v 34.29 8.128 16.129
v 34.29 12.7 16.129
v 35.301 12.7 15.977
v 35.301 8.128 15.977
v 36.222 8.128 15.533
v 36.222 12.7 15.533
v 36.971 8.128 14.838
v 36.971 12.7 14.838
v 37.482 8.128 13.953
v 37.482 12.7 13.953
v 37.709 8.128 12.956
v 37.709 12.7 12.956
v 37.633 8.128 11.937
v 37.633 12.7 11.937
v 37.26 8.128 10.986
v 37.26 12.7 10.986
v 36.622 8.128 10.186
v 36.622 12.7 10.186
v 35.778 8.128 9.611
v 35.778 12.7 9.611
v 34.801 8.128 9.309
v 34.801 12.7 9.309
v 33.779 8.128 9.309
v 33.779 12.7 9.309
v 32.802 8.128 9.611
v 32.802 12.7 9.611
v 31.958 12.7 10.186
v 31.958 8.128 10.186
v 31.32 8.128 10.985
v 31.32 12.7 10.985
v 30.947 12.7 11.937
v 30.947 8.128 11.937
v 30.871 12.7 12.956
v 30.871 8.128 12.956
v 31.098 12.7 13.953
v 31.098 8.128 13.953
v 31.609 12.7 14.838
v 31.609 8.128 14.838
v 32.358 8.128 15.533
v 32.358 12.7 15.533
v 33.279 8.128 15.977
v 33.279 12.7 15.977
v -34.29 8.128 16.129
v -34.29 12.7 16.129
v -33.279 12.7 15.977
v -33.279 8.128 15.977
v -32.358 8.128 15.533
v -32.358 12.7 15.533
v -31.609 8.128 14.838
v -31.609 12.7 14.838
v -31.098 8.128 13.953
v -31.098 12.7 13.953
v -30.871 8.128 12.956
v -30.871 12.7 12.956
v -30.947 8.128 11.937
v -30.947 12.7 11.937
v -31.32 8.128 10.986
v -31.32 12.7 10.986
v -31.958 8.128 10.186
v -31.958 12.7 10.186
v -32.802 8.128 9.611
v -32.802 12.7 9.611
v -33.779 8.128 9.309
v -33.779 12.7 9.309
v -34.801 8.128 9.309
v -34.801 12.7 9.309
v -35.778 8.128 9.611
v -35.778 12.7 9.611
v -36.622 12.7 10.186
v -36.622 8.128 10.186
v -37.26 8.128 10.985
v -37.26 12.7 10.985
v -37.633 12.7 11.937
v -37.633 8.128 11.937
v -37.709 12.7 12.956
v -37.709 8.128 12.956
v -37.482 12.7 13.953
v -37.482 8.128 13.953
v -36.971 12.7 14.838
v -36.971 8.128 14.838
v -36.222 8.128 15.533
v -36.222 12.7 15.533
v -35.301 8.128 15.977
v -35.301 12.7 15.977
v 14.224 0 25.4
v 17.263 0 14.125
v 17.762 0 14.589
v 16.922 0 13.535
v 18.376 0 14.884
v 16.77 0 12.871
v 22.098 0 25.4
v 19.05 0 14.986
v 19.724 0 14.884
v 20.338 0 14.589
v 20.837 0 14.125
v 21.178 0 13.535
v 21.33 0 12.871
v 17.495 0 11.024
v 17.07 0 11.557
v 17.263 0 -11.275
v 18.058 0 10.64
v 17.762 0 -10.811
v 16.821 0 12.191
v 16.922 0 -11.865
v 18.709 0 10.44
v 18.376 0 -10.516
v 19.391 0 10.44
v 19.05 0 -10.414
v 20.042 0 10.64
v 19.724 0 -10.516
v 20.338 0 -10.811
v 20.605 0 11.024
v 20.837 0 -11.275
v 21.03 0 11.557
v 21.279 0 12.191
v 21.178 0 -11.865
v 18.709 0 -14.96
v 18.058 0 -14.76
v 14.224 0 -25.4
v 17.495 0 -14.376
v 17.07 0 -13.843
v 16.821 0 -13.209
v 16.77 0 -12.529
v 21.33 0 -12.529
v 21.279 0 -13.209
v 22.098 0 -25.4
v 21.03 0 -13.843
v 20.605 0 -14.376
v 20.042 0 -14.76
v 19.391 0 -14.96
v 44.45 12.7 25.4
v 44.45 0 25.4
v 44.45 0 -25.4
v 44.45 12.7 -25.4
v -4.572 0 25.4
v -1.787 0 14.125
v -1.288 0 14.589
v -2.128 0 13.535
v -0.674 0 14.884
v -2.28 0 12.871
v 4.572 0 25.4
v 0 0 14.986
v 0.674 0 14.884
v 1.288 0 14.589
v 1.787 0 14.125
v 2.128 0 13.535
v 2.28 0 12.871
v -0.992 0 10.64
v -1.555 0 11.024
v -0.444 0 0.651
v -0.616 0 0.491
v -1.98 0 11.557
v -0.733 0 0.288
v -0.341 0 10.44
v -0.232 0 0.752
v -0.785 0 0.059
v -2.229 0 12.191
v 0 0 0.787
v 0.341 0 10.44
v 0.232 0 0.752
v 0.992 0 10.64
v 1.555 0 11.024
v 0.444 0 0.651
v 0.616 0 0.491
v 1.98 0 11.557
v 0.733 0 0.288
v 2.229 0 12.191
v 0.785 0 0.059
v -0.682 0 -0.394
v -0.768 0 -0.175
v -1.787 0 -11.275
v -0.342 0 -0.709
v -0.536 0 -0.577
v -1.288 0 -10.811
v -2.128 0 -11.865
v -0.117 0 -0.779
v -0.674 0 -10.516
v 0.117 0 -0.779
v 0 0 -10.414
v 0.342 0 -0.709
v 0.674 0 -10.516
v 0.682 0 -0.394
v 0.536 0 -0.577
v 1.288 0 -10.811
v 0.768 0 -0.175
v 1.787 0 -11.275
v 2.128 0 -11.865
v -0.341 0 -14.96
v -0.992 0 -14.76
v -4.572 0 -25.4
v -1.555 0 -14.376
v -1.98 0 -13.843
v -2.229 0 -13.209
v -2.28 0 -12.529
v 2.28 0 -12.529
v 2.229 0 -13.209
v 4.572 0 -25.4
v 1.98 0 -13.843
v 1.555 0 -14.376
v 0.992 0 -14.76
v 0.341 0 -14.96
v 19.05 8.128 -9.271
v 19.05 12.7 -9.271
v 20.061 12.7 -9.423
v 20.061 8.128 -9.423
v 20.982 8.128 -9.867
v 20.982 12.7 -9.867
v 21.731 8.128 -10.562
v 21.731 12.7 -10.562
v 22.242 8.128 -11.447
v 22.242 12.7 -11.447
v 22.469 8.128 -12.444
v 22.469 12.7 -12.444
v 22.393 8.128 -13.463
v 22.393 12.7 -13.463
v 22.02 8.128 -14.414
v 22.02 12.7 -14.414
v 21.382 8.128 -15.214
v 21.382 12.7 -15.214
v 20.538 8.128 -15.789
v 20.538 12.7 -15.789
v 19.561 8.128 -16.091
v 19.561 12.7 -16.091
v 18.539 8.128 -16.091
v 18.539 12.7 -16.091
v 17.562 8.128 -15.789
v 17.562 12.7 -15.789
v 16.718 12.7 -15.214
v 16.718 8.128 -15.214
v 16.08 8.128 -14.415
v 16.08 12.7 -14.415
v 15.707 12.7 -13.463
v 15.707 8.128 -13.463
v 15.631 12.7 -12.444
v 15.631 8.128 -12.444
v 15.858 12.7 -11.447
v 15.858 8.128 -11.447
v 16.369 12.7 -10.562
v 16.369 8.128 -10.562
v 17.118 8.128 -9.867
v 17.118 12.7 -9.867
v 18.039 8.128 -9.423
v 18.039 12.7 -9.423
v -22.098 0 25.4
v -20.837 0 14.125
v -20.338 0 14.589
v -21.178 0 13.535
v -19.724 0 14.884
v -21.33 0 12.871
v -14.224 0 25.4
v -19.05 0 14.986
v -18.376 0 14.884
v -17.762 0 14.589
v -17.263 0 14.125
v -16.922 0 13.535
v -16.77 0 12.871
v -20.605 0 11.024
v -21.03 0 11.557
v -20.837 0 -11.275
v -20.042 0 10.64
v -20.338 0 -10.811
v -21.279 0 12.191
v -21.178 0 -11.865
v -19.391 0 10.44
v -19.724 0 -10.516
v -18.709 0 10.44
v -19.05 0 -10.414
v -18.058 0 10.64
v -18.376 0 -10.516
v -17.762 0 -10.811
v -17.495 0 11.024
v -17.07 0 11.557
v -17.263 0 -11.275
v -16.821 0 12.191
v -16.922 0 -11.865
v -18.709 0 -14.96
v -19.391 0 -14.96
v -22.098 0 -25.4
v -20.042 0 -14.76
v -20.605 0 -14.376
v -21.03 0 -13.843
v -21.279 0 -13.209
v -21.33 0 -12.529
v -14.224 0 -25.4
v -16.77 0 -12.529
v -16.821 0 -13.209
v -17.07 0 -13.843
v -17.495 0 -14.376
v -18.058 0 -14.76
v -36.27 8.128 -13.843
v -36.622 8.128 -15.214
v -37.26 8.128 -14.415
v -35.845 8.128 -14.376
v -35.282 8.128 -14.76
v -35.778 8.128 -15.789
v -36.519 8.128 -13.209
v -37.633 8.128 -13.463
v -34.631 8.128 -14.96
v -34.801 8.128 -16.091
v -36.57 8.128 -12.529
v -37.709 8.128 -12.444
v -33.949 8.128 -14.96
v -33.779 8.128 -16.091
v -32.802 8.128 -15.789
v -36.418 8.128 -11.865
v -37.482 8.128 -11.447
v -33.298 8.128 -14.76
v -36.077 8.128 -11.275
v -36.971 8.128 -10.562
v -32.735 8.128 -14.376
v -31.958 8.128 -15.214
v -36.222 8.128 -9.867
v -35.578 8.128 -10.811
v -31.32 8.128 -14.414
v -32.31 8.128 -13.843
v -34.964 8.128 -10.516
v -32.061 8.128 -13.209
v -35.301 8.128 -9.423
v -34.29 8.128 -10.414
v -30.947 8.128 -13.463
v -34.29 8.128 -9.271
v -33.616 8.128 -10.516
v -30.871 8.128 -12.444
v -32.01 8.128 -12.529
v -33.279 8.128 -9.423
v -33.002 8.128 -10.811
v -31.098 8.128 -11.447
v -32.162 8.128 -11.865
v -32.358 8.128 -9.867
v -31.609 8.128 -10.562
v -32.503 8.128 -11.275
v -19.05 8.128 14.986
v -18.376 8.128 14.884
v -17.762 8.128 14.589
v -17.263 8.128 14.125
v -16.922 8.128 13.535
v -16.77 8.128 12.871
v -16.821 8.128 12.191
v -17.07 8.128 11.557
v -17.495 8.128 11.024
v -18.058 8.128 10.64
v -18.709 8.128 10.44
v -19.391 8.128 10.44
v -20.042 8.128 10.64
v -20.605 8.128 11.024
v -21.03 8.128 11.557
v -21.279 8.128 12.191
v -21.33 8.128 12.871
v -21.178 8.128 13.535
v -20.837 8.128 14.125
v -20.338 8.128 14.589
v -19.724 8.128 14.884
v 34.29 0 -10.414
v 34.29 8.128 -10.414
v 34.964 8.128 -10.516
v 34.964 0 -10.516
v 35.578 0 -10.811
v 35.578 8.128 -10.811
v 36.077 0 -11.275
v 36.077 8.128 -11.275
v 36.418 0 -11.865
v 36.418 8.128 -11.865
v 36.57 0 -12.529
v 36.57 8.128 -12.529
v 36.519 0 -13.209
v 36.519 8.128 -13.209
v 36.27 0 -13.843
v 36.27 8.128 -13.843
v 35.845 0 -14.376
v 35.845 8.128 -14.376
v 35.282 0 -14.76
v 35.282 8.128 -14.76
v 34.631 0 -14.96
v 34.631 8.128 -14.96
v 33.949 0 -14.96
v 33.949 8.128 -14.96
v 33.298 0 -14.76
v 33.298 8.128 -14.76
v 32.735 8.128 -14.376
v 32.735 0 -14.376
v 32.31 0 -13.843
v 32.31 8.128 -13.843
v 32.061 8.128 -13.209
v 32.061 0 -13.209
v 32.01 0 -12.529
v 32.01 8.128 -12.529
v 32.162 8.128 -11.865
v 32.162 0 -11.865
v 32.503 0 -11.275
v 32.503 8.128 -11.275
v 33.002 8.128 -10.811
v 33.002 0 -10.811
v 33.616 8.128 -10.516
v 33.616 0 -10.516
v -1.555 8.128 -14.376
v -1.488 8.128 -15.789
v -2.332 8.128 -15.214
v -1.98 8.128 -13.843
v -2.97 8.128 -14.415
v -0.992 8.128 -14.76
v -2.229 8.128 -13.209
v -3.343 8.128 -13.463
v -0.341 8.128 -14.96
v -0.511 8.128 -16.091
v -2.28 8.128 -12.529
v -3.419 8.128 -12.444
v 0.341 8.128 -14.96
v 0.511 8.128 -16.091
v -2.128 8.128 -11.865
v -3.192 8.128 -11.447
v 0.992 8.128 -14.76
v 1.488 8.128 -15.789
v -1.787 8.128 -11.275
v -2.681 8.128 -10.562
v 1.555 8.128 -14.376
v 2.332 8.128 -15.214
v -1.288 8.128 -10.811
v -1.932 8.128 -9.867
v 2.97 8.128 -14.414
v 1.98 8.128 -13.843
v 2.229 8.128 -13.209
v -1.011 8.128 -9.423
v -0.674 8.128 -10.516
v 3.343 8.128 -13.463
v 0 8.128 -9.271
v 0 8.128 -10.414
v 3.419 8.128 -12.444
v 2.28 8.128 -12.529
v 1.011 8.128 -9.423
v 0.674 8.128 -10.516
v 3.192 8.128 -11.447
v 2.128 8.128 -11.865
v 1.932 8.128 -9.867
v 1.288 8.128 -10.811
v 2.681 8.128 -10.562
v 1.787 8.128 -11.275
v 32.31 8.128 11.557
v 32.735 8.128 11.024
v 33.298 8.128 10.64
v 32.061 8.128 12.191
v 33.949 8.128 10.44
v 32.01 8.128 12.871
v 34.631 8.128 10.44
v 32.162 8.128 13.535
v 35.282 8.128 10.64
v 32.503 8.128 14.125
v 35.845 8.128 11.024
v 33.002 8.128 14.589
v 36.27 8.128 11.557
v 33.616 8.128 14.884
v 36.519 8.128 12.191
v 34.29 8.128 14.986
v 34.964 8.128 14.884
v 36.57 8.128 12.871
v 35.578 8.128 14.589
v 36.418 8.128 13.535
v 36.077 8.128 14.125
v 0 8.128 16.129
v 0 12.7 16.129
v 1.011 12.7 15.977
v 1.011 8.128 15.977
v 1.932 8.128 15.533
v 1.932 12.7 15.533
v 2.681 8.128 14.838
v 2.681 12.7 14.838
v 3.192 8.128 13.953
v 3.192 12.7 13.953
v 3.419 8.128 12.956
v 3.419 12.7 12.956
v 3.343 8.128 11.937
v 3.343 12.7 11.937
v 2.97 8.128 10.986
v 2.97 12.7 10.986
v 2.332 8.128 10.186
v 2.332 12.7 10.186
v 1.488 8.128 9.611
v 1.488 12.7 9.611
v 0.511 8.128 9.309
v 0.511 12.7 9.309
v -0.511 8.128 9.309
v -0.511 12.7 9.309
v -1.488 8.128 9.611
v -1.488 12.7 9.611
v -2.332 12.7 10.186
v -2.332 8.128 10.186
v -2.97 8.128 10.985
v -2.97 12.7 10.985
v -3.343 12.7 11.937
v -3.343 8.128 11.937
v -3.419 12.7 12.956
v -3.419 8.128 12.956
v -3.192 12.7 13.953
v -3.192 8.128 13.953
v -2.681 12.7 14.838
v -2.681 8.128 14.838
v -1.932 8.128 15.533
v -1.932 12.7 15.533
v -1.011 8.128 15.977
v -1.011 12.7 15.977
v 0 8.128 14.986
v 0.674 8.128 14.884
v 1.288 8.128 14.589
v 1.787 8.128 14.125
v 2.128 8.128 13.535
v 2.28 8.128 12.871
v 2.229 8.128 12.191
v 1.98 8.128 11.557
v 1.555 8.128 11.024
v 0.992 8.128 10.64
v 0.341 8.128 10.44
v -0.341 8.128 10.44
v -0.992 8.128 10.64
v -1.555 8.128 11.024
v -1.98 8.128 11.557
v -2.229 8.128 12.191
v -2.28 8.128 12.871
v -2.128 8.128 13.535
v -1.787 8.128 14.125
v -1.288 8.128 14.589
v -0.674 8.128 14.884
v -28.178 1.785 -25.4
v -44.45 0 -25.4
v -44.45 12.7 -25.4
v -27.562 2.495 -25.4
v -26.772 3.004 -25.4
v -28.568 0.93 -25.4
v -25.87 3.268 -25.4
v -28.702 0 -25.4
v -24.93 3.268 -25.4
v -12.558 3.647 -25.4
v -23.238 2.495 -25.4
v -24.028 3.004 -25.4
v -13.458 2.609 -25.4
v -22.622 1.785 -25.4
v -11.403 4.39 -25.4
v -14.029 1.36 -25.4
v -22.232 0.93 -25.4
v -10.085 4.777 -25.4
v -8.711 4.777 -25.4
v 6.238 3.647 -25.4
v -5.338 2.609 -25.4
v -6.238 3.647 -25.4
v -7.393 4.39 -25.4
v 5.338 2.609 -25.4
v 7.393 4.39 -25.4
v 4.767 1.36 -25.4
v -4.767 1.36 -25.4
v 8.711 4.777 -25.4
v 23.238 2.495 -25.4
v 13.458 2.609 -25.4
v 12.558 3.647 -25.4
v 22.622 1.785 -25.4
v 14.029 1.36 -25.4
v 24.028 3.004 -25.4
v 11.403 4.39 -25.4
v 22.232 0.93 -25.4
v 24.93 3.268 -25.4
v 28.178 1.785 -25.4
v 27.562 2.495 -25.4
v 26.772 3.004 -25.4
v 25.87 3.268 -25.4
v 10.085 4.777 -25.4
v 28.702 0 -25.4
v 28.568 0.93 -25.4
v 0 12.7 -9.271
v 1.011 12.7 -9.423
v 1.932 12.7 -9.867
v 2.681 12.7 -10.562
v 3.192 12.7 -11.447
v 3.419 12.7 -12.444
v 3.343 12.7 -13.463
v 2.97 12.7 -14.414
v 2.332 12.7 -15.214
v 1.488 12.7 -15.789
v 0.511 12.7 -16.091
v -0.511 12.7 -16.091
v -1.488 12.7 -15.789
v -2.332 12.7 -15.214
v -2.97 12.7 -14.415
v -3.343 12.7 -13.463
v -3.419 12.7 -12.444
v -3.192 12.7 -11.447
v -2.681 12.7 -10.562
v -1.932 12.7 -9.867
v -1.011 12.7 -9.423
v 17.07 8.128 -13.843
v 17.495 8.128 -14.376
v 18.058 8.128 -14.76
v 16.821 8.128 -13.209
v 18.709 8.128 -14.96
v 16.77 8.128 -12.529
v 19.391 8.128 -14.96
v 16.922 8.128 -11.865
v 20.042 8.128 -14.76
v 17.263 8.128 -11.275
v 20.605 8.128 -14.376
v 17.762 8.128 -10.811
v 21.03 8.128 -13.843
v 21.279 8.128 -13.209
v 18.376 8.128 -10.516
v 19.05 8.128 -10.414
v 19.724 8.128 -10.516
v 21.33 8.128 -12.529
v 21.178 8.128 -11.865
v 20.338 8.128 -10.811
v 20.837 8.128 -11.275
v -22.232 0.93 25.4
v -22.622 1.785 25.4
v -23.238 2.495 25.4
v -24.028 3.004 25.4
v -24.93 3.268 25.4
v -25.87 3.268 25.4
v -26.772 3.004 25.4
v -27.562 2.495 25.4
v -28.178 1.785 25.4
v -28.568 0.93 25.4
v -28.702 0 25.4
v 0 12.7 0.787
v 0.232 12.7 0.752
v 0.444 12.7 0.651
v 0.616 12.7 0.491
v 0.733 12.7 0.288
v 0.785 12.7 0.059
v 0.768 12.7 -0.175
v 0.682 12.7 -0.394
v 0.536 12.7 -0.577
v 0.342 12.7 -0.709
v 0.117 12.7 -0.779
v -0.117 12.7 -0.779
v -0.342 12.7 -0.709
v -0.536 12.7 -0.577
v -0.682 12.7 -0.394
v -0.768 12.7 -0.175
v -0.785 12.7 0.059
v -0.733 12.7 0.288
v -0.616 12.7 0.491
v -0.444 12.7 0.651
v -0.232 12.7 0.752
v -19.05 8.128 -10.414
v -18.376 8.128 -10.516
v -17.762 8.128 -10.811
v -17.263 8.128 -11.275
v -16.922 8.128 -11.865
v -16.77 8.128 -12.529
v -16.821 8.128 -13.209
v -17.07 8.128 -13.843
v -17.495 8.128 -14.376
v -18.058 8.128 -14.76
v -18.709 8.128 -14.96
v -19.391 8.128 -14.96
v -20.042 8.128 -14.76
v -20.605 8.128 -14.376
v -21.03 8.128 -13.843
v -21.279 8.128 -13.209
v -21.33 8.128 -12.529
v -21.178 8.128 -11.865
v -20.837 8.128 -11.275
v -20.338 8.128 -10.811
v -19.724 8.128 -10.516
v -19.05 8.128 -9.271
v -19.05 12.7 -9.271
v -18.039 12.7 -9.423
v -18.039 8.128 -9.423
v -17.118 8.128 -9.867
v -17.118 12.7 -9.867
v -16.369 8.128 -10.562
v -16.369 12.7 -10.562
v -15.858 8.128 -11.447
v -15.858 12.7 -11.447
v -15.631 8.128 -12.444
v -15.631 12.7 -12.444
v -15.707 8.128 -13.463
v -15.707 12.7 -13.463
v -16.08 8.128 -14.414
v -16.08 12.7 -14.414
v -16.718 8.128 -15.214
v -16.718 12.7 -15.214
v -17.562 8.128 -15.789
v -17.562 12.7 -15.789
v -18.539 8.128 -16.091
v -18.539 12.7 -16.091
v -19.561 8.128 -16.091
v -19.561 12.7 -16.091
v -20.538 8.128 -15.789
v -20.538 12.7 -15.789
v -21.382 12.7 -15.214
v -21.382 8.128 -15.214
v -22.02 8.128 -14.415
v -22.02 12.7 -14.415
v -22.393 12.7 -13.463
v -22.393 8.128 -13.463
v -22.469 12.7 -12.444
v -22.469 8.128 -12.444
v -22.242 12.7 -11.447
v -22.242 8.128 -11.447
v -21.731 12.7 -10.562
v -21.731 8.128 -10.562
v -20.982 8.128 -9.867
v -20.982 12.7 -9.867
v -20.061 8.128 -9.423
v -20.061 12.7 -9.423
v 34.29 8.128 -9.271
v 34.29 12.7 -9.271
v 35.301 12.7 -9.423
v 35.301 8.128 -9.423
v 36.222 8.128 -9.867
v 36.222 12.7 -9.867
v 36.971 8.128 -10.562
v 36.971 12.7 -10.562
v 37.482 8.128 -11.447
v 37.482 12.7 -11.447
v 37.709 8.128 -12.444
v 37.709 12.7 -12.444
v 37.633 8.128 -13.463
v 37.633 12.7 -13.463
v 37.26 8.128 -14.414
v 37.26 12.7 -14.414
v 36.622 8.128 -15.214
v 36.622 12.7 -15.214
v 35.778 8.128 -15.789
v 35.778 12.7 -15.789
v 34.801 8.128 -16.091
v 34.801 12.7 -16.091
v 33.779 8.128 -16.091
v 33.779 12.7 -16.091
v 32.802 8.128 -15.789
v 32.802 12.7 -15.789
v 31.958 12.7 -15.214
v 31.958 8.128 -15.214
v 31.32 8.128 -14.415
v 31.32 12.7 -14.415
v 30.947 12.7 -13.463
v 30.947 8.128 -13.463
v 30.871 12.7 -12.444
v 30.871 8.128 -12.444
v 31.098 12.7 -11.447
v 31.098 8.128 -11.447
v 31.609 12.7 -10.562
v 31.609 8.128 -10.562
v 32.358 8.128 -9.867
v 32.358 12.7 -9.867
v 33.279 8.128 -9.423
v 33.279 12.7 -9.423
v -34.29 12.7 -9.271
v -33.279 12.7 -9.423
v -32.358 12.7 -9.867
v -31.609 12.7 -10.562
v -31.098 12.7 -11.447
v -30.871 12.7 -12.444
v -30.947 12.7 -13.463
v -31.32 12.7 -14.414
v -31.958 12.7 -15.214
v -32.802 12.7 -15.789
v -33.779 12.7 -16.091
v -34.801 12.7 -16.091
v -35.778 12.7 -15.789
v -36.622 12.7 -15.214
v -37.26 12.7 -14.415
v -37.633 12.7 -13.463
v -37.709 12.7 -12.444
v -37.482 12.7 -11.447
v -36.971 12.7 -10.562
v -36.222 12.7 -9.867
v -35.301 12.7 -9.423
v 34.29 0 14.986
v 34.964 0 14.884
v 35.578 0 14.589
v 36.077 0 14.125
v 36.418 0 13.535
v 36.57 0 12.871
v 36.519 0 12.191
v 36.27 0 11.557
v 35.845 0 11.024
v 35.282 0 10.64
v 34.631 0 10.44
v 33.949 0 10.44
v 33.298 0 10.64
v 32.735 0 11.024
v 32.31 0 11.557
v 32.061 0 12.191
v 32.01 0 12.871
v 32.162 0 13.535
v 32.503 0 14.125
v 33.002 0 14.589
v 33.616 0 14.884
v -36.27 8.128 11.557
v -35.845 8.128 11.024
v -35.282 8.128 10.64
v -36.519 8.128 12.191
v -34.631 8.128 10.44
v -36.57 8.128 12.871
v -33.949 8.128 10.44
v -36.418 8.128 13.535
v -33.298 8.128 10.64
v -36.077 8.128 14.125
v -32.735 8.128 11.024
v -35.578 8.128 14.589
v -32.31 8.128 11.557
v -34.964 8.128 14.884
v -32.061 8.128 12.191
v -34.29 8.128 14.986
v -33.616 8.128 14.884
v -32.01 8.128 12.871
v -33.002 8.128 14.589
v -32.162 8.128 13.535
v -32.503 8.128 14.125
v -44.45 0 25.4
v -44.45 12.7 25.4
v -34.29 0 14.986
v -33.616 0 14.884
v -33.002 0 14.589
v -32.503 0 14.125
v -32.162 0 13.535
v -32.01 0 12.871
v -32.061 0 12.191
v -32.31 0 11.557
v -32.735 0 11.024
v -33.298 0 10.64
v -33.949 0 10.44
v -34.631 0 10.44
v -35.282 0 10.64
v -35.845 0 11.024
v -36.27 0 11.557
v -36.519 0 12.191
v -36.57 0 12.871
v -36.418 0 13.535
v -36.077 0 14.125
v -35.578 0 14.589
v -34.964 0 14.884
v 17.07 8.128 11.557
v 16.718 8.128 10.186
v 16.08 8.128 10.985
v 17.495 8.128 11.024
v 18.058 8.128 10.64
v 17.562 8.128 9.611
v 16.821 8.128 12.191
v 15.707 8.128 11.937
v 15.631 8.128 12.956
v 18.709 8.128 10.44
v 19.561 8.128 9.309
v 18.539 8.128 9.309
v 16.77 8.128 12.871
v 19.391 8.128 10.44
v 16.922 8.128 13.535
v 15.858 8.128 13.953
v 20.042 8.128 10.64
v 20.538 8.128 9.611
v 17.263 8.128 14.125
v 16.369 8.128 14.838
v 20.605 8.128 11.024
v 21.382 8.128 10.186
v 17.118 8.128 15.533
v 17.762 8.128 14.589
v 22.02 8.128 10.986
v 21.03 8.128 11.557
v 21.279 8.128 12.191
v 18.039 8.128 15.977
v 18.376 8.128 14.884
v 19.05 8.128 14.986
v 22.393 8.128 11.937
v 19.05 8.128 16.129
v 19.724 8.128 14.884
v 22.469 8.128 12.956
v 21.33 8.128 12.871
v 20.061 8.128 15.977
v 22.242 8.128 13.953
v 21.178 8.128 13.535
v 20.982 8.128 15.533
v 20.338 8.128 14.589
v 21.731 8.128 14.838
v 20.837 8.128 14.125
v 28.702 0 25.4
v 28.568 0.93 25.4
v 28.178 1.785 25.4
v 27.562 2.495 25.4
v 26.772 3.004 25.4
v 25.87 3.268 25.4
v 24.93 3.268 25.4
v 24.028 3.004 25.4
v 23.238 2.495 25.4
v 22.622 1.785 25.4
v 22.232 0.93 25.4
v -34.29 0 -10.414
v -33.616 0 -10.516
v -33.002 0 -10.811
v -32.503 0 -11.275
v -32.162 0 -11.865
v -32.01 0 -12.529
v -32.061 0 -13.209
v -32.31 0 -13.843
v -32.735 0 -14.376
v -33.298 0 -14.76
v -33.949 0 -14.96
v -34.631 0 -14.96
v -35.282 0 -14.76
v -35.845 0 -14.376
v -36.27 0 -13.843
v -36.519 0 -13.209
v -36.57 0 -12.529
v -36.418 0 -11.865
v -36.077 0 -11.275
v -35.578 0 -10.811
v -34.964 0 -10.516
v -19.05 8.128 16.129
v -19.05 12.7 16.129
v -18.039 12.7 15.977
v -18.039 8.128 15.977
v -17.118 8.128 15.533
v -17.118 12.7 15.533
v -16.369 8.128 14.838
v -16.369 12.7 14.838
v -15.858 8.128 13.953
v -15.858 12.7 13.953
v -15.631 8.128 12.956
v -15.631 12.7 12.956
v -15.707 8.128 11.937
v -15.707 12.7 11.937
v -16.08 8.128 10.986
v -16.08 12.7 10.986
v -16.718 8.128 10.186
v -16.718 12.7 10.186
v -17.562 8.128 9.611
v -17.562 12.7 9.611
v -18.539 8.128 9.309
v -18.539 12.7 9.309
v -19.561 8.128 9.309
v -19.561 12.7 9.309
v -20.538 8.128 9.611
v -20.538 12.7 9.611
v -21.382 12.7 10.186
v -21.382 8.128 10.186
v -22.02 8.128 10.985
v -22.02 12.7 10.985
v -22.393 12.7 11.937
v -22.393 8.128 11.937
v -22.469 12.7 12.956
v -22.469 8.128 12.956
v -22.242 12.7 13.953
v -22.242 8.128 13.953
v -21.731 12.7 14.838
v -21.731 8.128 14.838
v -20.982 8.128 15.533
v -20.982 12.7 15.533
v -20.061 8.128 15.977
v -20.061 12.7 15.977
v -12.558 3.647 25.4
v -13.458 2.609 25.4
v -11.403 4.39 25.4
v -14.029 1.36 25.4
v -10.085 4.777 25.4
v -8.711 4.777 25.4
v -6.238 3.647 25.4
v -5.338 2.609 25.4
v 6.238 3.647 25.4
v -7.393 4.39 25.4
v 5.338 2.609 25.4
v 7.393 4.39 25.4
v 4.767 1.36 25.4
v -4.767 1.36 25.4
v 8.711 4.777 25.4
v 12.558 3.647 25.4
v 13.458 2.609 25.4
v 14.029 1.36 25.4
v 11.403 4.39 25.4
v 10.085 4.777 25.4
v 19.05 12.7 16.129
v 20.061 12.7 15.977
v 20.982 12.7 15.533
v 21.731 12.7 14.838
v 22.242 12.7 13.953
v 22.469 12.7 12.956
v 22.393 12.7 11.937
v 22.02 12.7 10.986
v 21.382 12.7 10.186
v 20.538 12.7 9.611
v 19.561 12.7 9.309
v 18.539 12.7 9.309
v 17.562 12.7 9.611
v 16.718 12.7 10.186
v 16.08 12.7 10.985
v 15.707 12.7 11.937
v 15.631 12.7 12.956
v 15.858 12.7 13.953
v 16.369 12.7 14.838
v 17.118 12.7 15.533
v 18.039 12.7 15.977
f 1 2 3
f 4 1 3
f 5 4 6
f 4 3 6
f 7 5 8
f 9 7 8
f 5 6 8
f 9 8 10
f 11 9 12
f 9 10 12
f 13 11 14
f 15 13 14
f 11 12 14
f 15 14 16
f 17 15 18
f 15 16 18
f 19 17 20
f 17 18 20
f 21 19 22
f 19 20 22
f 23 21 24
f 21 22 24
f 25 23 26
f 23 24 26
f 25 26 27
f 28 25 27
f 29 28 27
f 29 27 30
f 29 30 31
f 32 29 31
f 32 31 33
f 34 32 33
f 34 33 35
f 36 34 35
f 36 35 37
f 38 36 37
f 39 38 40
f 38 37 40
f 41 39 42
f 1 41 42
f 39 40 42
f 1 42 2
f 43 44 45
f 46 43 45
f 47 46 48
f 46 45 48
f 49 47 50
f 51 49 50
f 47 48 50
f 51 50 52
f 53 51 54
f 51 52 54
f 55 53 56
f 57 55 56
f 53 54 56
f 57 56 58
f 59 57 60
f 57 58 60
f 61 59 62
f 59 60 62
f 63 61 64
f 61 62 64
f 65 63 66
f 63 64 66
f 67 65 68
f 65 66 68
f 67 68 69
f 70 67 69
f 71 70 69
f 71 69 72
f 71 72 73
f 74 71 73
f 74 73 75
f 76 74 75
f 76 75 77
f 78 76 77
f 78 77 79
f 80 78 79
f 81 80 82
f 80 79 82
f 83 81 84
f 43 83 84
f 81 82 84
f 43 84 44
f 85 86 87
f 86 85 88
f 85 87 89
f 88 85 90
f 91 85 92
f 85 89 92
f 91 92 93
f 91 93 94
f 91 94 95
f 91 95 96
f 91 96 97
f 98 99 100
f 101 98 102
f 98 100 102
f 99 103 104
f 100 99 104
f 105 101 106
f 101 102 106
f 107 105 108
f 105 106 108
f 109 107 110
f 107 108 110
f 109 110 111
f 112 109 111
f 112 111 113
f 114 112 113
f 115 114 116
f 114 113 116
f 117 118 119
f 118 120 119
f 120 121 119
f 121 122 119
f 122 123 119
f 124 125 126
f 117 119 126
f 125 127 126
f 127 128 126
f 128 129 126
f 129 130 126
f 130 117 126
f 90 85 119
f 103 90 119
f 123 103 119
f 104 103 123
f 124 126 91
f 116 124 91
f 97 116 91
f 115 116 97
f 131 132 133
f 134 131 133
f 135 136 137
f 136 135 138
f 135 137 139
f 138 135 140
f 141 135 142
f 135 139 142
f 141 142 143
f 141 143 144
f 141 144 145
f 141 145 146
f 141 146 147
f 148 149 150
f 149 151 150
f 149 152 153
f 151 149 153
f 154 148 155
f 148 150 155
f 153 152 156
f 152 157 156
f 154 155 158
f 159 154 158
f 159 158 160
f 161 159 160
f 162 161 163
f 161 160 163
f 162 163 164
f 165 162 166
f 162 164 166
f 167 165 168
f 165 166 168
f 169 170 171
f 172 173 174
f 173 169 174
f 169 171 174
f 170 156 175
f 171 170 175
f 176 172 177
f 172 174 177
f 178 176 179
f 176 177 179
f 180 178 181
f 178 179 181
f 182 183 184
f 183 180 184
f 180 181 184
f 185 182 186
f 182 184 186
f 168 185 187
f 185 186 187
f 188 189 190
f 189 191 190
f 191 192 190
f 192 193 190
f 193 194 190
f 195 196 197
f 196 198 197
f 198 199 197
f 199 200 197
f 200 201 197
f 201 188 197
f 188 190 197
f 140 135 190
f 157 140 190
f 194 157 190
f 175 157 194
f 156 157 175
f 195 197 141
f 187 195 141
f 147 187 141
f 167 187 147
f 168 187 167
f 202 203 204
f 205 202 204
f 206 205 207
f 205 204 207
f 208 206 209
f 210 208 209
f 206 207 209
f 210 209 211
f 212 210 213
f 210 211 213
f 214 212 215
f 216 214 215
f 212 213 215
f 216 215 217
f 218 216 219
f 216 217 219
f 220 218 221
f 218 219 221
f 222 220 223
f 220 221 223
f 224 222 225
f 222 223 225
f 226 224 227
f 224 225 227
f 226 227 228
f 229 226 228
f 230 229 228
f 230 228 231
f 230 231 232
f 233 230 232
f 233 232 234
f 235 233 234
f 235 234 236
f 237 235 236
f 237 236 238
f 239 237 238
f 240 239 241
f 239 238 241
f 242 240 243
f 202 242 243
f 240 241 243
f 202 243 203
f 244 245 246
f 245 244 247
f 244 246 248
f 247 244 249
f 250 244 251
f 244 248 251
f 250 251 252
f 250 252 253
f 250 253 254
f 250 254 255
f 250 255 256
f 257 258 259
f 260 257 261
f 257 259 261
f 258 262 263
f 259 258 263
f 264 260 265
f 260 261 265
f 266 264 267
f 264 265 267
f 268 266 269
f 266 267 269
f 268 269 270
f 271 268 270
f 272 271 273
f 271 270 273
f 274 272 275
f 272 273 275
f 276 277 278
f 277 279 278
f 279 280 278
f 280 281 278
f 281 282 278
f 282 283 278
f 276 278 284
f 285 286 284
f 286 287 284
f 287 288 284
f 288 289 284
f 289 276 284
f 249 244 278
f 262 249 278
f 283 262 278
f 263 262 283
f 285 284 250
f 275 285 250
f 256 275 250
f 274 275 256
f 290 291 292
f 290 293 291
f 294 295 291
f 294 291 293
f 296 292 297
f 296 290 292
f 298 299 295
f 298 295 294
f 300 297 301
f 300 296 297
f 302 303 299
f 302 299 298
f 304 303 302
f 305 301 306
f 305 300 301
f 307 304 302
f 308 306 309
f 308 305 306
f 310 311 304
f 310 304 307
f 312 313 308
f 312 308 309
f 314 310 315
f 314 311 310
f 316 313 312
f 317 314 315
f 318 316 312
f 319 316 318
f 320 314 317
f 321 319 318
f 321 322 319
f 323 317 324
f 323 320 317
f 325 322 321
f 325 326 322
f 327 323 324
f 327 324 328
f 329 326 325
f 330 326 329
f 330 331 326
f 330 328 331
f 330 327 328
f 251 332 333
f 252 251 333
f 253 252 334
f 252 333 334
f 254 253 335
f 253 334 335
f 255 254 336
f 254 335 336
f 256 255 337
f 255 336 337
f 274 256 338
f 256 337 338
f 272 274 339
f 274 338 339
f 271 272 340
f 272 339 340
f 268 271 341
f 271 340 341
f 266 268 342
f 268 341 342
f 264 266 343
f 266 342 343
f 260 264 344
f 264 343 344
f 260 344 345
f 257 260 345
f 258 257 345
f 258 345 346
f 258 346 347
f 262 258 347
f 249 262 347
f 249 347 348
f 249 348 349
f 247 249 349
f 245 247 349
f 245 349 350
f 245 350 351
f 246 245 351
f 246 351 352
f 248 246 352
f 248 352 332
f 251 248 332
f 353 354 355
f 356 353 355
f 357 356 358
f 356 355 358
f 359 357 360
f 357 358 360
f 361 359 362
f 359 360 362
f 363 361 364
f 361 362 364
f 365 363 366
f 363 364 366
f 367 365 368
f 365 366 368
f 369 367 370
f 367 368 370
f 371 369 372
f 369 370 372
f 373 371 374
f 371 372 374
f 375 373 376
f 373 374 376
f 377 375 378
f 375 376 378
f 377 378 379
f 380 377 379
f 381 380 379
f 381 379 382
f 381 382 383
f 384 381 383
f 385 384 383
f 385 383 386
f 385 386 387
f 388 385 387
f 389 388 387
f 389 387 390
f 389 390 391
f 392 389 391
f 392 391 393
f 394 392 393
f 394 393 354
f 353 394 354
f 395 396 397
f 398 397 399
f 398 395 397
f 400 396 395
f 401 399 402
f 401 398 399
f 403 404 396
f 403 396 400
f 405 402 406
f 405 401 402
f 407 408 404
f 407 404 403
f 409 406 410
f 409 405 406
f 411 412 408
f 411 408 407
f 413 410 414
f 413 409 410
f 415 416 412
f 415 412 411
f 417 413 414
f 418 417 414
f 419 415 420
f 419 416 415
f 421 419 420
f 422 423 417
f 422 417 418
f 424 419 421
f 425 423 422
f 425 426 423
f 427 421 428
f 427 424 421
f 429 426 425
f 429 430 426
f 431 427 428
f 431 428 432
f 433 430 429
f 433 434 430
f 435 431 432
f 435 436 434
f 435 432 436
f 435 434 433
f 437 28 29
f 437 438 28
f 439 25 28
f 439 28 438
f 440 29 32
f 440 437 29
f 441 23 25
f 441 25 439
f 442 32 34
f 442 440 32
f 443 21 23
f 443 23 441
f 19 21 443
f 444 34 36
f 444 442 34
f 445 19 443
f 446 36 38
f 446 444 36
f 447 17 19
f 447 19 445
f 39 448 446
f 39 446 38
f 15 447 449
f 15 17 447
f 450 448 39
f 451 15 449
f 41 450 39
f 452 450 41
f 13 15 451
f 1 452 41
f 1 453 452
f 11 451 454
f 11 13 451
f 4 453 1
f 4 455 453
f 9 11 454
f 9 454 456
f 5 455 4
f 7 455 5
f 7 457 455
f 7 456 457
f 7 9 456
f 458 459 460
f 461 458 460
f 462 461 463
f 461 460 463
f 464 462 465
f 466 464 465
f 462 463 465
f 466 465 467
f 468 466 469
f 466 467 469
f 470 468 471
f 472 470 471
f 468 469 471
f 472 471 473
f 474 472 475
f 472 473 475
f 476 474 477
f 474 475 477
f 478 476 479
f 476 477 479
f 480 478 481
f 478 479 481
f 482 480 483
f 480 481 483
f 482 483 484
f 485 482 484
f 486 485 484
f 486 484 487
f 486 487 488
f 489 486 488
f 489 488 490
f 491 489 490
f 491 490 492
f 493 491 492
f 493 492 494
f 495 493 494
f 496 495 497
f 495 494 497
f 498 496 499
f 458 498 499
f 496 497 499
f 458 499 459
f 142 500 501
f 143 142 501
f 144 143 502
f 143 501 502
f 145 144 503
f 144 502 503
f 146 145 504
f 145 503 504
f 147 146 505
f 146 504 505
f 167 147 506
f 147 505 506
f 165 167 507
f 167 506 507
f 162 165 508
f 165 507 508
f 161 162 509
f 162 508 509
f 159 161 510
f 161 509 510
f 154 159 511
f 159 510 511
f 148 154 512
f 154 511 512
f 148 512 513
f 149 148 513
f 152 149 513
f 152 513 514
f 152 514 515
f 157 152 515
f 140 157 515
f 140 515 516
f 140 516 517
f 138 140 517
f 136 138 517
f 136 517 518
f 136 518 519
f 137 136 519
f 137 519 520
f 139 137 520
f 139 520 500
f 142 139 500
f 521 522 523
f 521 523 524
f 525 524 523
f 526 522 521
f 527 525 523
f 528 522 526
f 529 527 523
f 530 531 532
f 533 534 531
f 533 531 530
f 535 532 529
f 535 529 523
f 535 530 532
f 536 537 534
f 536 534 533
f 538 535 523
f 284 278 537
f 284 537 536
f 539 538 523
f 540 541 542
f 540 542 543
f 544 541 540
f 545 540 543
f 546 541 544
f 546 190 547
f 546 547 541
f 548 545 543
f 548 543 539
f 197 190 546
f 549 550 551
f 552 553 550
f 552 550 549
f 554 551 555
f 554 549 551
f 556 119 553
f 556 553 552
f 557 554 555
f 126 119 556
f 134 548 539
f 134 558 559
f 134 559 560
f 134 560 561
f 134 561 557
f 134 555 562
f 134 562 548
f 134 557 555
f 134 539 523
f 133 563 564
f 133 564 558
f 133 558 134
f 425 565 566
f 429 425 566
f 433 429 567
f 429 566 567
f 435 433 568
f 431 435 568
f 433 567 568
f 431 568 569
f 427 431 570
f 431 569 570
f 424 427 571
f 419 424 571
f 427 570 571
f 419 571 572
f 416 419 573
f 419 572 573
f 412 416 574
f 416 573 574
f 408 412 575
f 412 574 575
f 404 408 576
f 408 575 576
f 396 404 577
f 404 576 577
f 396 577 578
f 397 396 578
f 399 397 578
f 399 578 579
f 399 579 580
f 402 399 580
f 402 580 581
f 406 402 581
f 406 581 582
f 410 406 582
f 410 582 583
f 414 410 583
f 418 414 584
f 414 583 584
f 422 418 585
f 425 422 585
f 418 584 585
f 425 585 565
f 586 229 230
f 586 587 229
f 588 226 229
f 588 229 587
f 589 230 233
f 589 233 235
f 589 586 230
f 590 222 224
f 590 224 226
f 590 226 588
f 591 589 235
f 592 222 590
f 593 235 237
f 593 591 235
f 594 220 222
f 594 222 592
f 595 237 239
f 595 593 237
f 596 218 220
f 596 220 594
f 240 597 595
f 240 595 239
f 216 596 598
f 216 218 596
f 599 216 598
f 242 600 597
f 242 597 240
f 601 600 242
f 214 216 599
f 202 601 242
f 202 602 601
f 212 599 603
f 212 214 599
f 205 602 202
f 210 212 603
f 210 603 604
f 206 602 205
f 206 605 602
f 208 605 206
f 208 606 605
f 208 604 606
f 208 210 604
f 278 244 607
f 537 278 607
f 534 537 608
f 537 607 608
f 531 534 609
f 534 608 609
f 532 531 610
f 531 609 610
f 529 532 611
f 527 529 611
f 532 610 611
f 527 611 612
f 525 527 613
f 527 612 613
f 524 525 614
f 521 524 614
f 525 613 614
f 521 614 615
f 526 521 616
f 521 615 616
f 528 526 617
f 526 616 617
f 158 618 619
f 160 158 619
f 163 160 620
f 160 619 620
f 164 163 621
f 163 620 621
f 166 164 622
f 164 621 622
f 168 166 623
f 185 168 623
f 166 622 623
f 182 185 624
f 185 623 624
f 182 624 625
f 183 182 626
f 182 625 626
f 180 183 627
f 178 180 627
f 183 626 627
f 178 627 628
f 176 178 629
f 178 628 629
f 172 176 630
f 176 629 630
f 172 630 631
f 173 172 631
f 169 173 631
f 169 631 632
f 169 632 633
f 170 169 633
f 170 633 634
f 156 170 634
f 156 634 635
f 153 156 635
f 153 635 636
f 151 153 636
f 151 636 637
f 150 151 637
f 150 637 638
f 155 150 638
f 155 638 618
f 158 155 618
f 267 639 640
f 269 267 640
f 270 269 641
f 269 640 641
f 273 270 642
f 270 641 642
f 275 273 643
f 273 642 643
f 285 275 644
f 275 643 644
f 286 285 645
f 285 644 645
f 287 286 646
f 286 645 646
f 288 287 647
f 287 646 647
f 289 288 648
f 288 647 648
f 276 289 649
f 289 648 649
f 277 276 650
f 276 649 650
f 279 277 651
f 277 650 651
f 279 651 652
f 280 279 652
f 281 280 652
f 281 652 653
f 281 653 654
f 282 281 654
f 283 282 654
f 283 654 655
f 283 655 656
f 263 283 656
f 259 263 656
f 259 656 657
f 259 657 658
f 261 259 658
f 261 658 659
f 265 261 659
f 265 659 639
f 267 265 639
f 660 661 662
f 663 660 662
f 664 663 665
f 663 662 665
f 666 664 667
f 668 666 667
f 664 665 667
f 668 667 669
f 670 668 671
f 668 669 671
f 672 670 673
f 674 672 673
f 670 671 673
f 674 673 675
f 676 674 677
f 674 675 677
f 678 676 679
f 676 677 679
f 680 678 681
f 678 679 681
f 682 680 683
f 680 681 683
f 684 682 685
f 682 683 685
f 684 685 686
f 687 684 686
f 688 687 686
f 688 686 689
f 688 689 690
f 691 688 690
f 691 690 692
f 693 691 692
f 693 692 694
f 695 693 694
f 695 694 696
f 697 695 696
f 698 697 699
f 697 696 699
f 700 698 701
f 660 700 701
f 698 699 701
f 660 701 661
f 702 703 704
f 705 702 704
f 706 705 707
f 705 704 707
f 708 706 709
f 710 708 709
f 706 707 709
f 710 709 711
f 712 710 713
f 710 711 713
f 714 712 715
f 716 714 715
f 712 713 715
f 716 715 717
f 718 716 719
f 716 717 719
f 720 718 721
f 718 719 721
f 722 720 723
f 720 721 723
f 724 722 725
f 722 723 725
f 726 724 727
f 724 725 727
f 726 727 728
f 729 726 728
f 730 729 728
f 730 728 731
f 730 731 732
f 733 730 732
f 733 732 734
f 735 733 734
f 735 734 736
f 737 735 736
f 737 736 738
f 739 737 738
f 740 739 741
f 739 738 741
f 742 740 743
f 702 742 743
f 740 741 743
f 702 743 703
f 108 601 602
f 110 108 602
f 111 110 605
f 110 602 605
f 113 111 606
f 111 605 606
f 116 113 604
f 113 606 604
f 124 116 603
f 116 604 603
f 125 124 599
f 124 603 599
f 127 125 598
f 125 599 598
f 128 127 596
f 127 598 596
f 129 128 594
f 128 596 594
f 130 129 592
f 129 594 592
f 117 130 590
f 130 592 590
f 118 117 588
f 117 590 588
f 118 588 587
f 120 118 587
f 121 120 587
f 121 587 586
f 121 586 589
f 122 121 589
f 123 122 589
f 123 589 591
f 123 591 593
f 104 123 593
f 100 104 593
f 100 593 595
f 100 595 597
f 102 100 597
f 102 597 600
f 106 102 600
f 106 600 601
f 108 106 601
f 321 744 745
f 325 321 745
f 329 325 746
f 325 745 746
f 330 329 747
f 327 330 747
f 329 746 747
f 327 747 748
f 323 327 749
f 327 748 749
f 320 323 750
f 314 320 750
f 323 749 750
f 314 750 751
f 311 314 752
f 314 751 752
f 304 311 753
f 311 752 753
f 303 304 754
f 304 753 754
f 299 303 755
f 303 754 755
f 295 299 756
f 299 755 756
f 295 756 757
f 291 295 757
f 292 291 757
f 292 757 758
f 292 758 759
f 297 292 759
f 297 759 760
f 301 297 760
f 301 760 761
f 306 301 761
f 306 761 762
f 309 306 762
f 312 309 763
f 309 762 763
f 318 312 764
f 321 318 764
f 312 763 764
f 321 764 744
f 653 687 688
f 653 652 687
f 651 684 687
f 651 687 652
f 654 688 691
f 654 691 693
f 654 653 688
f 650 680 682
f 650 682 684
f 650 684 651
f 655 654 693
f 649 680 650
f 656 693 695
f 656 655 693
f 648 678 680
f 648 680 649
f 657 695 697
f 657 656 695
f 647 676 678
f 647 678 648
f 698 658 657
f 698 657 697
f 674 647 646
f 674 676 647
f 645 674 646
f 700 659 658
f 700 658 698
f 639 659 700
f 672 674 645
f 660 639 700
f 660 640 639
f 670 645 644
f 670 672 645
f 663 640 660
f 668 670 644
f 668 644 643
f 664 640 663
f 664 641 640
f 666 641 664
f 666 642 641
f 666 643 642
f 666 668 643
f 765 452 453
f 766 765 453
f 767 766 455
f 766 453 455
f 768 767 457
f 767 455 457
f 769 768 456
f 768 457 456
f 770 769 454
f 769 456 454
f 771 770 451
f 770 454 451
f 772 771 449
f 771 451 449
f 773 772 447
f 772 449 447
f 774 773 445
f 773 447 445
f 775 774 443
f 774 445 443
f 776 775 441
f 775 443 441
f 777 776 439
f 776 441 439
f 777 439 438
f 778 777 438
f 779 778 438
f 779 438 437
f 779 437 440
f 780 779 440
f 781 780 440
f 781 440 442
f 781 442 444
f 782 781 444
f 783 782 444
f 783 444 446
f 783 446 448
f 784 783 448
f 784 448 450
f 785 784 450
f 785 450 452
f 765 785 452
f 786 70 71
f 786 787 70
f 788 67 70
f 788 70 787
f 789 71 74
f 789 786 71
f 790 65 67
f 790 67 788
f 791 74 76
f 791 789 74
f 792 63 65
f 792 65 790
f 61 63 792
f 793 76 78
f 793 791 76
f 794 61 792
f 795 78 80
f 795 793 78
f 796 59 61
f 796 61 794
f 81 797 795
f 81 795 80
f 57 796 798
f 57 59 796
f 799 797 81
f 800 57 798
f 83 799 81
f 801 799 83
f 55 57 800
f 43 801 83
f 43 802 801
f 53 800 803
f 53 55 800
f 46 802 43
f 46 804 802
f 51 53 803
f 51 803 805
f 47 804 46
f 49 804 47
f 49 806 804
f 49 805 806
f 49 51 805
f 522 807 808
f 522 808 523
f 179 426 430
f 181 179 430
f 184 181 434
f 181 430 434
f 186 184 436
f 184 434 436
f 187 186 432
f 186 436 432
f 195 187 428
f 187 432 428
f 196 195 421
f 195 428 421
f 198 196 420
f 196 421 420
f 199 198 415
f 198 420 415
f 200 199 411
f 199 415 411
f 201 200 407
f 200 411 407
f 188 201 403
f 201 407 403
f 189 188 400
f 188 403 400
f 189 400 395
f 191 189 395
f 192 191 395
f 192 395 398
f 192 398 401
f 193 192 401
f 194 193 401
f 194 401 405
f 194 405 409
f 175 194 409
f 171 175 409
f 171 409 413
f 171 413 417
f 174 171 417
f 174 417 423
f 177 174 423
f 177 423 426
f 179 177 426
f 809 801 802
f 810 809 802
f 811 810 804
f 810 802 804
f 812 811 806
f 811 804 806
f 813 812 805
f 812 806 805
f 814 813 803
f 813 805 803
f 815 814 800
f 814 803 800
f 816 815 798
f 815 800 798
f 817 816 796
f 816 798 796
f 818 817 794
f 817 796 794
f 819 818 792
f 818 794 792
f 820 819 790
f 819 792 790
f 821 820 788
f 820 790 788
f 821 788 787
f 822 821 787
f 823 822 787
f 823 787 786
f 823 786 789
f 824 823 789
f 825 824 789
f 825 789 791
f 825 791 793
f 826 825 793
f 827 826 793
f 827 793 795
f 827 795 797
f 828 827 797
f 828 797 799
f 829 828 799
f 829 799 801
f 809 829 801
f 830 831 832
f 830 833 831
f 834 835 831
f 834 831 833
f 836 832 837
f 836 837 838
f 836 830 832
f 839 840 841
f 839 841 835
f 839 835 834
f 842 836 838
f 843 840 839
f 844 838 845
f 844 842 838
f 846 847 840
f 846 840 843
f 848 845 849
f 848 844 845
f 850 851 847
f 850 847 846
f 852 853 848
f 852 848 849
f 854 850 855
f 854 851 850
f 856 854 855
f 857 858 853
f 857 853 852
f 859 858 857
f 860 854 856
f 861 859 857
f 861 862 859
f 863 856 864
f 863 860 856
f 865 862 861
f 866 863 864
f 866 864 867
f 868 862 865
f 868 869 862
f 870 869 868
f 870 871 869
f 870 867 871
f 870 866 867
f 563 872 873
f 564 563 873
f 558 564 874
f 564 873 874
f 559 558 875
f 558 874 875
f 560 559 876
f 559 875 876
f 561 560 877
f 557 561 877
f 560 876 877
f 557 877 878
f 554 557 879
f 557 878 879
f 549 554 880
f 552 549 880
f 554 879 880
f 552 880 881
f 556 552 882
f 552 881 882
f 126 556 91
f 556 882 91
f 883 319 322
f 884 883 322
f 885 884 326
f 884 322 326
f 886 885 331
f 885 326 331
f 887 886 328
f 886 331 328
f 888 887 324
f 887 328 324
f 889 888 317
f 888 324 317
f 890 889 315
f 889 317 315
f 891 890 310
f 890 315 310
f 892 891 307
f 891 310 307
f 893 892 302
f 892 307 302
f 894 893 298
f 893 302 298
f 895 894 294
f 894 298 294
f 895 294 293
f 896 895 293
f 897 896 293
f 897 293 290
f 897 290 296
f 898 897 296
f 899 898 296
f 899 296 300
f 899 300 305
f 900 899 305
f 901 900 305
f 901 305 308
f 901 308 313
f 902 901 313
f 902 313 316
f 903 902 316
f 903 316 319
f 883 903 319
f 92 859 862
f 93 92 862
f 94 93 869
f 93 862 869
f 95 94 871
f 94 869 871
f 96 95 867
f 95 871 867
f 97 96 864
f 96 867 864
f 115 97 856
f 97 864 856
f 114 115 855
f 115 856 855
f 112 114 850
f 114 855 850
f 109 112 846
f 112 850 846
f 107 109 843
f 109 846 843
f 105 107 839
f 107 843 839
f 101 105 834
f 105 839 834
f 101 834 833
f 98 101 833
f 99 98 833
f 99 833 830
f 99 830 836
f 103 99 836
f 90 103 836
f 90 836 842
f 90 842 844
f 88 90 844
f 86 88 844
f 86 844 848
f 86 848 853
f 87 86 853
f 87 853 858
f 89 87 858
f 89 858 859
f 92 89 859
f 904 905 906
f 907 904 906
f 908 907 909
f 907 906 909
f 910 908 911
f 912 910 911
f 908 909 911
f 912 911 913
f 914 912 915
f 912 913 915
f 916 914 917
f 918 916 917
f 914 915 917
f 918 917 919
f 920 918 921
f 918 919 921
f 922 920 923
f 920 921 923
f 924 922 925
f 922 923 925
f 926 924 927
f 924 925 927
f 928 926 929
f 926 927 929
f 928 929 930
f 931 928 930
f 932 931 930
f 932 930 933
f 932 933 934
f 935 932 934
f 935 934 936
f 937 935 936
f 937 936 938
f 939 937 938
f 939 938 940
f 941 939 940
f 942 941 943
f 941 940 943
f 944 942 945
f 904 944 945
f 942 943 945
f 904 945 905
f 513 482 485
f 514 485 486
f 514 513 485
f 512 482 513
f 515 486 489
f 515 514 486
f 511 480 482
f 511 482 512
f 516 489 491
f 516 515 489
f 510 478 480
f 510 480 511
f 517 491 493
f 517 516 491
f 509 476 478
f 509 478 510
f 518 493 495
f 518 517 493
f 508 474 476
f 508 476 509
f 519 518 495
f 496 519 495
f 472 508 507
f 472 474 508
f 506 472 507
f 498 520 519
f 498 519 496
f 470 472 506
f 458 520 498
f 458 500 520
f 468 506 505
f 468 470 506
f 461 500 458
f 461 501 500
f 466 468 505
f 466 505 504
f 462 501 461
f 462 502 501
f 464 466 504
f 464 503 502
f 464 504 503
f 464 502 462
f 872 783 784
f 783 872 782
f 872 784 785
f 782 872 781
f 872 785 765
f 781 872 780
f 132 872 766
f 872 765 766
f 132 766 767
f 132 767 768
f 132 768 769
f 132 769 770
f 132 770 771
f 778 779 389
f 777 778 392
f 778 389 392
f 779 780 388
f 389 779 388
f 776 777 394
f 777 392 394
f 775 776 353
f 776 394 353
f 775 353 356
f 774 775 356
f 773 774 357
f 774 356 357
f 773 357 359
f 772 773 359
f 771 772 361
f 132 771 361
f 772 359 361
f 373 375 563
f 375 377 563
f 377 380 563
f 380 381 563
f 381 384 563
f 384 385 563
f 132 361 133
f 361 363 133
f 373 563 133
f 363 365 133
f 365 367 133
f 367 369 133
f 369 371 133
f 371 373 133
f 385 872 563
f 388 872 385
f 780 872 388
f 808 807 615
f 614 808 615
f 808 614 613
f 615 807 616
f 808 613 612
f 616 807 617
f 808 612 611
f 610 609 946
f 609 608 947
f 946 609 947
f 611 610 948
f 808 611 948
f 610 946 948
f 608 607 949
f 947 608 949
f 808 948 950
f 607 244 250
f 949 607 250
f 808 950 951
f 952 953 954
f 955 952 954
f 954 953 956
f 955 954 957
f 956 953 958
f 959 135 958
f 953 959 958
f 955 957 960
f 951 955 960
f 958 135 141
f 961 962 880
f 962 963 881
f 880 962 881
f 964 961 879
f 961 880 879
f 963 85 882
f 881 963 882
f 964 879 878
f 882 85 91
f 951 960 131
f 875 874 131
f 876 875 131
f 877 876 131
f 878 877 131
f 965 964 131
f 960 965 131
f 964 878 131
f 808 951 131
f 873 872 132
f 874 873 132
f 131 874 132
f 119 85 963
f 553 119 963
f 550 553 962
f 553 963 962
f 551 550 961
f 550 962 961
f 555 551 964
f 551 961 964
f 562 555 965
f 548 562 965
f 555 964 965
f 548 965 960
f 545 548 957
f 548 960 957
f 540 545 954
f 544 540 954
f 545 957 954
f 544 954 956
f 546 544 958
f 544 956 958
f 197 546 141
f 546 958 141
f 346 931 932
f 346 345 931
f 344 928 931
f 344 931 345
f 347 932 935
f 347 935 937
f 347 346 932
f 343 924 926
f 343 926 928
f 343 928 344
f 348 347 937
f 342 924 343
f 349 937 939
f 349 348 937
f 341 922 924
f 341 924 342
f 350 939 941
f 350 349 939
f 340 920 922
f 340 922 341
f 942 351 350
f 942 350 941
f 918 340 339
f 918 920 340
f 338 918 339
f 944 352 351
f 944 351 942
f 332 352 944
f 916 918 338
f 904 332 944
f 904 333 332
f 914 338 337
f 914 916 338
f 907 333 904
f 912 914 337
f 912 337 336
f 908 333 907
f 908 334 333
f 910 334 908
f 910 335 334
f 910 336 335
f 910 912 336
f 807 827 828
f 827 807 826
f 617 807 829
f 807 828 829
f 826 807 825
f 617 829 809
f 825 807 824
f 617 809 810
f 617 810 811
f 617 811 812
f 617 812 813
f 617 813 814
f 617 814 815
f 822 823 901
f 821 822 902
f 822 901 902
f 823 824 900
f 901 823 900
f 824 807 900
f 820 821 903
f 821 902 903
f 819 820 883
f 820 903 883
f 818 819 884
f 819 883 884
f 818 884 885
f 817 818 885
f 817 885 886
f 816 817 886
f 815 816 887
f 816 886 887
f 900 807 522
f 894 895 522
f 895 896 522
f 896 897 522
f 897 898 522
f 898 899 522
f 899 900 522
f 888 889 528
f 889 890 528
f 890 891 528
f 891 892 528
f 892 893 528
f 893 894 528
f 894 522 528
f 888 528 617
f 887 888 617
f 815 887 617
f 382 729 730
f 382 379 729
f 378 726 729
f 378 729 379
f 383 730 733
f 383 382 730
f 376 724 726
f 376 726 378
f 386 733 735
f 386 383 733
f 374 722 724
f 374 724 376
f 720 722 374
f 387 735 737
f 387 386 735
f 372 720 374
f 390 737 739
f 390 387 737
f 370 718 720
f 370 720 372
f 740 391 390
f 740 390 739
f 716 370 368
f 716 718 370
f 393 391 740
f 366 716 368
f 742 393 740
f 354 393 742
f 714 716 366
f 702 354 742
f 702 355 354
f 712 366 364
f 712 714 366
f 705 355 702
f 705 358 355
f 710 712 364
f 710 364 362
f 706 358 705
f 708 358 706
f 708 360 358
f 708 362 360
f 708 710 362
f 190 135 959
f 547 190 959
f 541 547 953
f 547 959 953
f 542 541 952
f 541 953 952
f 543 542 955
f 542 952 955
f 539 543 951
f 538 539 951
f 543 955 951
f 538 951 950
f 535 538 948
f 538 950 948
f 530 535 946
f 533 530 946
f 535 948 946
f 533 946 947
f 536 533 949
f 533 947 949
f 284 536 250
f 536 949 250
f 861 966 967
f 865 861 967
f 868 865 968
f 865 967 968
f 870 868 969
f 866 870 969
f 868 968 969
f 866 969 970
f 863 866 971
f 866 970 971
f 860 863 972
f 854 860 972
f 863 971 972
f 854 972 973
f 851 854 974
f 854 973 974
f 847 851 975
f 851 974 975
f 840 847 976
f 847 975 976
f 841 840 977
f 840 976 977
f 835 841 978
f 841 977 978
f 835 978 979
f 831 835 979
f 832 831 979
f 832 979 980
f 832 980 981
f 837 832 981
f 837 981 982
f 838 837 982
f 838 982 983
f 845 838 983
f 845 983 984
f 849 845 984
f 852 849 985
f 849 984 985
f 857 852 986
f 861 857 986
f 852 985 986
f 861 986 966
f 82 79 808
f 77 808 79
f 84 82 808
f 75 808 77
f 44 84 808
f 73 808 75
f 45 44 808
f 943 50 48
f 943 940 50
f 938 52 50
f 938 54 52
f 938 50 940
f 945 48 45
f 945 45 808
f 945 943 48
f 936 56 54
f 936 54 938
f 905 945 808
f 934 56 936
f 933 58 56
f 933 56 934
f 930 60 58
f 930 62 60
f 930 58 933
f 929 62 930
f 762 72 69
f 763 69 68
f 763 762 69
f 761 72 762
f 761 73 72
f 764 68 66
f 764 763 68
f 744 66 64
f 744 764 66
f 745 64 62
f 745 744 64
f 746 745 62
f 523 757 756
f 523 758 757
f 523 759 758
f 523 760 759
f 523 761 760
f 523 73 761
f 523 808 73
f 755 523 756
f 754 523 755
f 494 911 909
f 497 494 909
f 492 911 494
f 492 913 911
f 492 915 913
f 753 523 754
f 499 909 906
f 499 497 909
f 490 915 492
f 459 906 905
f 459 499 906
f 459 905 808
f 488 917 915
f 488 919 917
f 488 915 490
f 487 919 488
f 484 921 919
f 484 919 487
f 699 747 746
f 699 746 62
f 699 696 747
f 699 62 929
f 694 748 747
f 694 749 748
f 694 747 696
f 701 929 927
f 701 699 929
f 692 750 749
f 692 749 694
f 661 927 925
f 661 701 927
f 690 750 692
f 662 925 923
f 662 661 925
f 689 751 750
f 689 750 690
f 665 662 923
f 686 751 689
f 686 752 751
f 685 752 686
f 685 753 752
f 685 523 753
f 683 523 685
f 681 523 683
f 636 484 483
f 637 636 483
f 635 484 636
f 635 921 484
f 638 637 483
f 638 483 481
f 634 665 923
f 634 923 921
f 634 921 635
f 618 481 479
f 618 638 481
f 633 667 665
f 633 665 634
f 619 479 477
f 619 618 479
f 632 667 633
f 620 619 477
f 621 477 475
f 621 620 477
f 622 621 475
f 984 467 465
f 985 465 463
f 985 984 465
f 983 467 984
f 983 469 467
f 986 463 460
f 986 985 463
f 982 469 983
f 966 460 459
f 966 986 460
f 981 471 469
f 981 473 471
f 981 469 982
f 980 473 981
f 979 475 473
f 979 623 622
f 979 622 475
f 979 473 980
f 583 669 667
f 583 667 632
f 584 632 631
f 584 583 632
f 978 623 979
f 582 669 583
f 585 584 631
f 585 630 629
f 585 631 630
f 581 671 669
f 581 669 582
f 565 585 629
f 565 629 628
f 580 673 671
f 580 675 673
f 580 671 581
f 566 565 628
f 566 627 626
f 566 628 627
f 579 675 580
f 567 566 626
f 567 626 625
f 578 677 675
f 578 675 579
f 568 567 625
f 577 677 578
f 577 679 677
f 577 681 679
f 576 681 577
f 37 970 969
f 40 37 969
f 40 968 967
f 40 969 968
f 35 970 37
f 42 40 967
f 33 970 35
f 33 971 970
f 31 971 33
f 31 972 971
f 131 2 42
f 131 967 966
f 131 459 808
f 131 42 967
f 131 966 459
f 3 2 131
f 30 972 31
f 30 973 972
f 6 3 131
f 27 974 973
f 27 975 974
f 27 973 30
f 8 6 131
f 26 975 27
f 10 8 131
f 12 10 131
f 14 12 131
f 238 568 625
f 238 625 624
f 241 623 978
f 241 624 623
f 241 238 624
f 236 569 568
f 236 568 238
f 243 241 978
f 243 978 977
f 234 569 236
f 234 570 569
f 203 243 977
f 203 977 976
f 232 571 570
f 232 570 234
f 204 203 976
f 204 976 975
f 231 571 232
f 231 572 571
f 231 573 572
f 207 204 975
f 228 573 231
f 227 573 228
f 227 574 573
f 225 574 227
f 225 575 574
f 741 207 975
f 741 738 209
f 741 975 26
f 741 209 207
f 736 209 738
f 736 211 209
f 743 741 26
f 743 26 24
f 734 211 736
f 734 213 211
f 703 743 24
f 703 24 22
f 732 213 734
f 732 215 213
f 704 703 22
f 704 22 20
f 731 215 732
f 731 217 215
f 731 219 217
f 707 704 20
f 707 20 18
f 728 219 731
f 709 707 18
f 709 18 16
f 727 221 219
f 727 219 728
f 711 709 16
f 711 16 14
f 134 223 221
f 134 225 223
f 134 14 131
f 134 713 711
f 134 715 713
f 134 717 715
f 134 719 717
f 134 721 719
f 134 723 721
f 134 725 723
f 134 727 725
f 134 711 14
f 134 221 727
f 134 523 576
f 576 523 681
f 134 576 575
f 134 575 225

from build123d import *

# Parameters (mm, degrees)
SKETCH1_W           = 88.9
SKETCH1_H           = 50.8
BOSS_EXTRUDE1_DEPTH = 12.7
SKETCH2_R           = 3.429
SKETCH2_R_2         = 2.286
CUT_EXTRUDE1_DEPTH  = 4.572
SKETCH3_R           = 2.286
CUT_EXTRUDE2_DEPTH  = 53.74706153
LPATTERN1_COUNT     = 2
LPATTERN1_PITCH     = 25.4
CUT_EXTRUDE3_DEPTH  = 69.685751798
SKETCH5_R           = 0.7874
CUT_EXTRUDE4_DEPTH  = 53.74706153
SKETCH6_R           = 2.286
CUT_EXTRUDE5_DEPTH  = 53.74706153


with BuildPart() as part:
    # Sketch1 → Boss-Extrude1 (new body)
    with BuildSketch(Plane(origin=(0, 0, 0), x_dir=(1, 0, 0), z_dir=(0, 1, 0))):
        Rectangle(SKETCH1_W, SKETCH1_H)
    extrude(amount=BOSS_EXTRUDE1_DEPTH)

    # Sketch2 → Cut-Extrude1 (cut)
    # profile 1 of 5: a face of its own
    with BuildSketch(Plane(origin=(0, 12.7, 0), x_dir=(1, 0, 0), z_dir=(0, 1, 0))):
        with Locations(Location((-34.29, 12.7, 0), (0, 0, 270))):
            Circle(SKETCH2_R)
        with Locations(Location((-34.29, 12.7, 0), (0, 0, 270))):
            Circle(SKETCH2_R_2, mode=Mode.SUBTRACT)
    # profile 2 of 5: a face of its own
    with BuildSketch(Plane(origin=(0, 12.7, 0), x_dir=(1, 0, 0), z_dir=(0, 1, 0))):
        with Locations(Location((-19.05, 12.7, 0), (0, 0, 270))):
            Circle(SKETCH2_R)
        with Locations(Location((-19.05, 12.7, 0), (0, 0, 270))):
            Circle(SKETCH2_R_2, mode=Mode.SUBTRACT)
    # profile 3 of 5: a face of its own
    with BuildSketch(Plane(origin=(0, 12.7, 0), x_dir=(1, 0, 0), z_dir=(0, 1, 0))):
        with Locations(Location((0, 12.7, 0), (0, 0, 270))):
            Circle(SKETCH2_R)
        with Locations(Location((0, 12.7, 0), (0, 0, 270))):
            Circle(SKETCH2_R_2, mode=Mode.SUBTRACT)
    # profile 4 of 5: a face of its own
    with BuildSketch(Plane(origin=(0, 12.7, 0), x_dir=(1, 0, 0), z_dir=(0, 1, 0))):
        with Locations(Location((19.05, 12.7, 0), (0, 0, 270))):
            Circle(SKETCH2_R)
        with Locations(Location((19.05, 12.7, 0), (0, 0, 270))):
            Circle(SKETCH2_R_2, mode=Mode.SUBTRACT)
    # profile 5 of 5: a face of its own
    with BuildSketch(Plane(origin=(0, 12.7, 0), x_dir=(1, 0, 0), z_dir=(0, 1, 0))):
        with Locations(Location((34.29, 12.7, 0), (0, 0, 270))):
            Circle(SKETCH2_R)
        with Locations(Location((34.29, 12.7, 0), (0, 0, 270))):
            Circle(SKETCH2_R_2, mode=Mode.SUBTRACT)
    cut_extrude1 = extrude(amount=-CUT_EXTRUDE1_DEPTH, mode=Mode.SUBTRACT)

    # Sketch3 → Cut-Extrude2 (cut, through all)
    with BuildSketch(Plane(origin=(0, 12.7, 0), x_dir=(1, 0, 0), z_dir=(0, 1, 0))):
        with Locations(Location((-34.29, 12.7, 0), (0, 0, 270))):
            Circle(SKETCH3_R)
        with Locations(Location((-19.05, 12.7, 0), (0, 0, 270))):
            Circle(SKETCH3_R)
        with Locations(Location((0, 12.7, 0), (0, 0, 270))):
            Circle(SKETCH3_R)
        with Locations(Location((19.05, 12.7, 0), (0, 0, 270))):
            Circle(SKETCH3_R)
        with Locations(Location((34.29, 12.7, 0), (0, 0, 270))):
            Circle(SKETCH3_R)
    extrude(amount=-CUT_EXTRUDE2_DEPTH, mode=Mode.SUBTRACT)

    # LPattern1: Cut-Extrude1 ×2
    with Locations(*[(0, 0, i * LPATTERN1_PITCH) for i in range(1, LPATTERN1_COUNT)]):
        add(cut_extrude1, mode=Mode.SUBTRACT)

    # Sketch4 → Cut-Extrude3 (cut, through all)
    with BuildSketch(Plane.XY.offset(25.4)):
        with BuildLine():
            Line((-28.702, 0), (-22.098, 0))
            ThreePointArc((-22.098, 0), (-25.4, 3.302), (-28.702, 0))
        make_face()
        with BuildLine():
            Line((-14.224, 0), (-4.572, 0))
            ThreePointArc((-4.572, 0), (-9.398, 4.826), (-14.224, 0))
        make_face()
        with BuildLine():
            Line((4.572, 0), (14.224, 0))
            ThreePointArc((14.224, 0), (9.398, 4.826), (4.572, 0))
        make_face()
        with BuildLine():
            Line((22.098, 0), (28.702, 0))
            ThreePointArc((28.702, 0), (25.4, 3.302), (22.098, 0))
        make_face()
    extrude(amount=-CUT_EXTRUDE3_DEPTH, mode=Mode.SUBTRACT)

    # Sketch5 → Cut-Extrude4 (cut, through all)
    with BuildSketch(Plane(origin=(0, 12.7, 0), x_dir=(1, 0, 0), z_dir=(0, 1, 0))):
        with Locations(Location((0, 0, 0), (0, 0, 270))):
            Circle(SKETCH5_R)
    extrude(amount=-CUT_EXTRUDE4_DEPTH, mode=Mode.SUBTRACT)

    # Sketch6 → Cut-Extrude5 (cut, through all)
    with BuildSketch(Plane(origin=(0, 12.7, 0), x_dir=(1, 0, 0), z_dir=(0, 1, 0))):
        with Locations(Location((-34.29, -12.7, 0), (0, 0, 270))):
            Circle(SKETCH6_R)
        with Locations(Location((-19.05, -12.7, 0), (0, 0, 270))):
            Circle(SKETCH6_R)
        with Locations(Location((0, -12.7, 0), (0, 0, 270))):
            Circle(SKETCH6_R)
        with Locations(Location((19.05, -12.7, 0), (0, 0, 270))):
            Circle(SKETCH6_R)
        with Locations(Location((34.29, -12.7, 0), (0, 0, 270))):
            Circle(SKETCH6_R)
    extrude(amount=-CUT_EXTRUDE5_DEPTH, mode=Mode.SUBTRACT)


solid = part.part
